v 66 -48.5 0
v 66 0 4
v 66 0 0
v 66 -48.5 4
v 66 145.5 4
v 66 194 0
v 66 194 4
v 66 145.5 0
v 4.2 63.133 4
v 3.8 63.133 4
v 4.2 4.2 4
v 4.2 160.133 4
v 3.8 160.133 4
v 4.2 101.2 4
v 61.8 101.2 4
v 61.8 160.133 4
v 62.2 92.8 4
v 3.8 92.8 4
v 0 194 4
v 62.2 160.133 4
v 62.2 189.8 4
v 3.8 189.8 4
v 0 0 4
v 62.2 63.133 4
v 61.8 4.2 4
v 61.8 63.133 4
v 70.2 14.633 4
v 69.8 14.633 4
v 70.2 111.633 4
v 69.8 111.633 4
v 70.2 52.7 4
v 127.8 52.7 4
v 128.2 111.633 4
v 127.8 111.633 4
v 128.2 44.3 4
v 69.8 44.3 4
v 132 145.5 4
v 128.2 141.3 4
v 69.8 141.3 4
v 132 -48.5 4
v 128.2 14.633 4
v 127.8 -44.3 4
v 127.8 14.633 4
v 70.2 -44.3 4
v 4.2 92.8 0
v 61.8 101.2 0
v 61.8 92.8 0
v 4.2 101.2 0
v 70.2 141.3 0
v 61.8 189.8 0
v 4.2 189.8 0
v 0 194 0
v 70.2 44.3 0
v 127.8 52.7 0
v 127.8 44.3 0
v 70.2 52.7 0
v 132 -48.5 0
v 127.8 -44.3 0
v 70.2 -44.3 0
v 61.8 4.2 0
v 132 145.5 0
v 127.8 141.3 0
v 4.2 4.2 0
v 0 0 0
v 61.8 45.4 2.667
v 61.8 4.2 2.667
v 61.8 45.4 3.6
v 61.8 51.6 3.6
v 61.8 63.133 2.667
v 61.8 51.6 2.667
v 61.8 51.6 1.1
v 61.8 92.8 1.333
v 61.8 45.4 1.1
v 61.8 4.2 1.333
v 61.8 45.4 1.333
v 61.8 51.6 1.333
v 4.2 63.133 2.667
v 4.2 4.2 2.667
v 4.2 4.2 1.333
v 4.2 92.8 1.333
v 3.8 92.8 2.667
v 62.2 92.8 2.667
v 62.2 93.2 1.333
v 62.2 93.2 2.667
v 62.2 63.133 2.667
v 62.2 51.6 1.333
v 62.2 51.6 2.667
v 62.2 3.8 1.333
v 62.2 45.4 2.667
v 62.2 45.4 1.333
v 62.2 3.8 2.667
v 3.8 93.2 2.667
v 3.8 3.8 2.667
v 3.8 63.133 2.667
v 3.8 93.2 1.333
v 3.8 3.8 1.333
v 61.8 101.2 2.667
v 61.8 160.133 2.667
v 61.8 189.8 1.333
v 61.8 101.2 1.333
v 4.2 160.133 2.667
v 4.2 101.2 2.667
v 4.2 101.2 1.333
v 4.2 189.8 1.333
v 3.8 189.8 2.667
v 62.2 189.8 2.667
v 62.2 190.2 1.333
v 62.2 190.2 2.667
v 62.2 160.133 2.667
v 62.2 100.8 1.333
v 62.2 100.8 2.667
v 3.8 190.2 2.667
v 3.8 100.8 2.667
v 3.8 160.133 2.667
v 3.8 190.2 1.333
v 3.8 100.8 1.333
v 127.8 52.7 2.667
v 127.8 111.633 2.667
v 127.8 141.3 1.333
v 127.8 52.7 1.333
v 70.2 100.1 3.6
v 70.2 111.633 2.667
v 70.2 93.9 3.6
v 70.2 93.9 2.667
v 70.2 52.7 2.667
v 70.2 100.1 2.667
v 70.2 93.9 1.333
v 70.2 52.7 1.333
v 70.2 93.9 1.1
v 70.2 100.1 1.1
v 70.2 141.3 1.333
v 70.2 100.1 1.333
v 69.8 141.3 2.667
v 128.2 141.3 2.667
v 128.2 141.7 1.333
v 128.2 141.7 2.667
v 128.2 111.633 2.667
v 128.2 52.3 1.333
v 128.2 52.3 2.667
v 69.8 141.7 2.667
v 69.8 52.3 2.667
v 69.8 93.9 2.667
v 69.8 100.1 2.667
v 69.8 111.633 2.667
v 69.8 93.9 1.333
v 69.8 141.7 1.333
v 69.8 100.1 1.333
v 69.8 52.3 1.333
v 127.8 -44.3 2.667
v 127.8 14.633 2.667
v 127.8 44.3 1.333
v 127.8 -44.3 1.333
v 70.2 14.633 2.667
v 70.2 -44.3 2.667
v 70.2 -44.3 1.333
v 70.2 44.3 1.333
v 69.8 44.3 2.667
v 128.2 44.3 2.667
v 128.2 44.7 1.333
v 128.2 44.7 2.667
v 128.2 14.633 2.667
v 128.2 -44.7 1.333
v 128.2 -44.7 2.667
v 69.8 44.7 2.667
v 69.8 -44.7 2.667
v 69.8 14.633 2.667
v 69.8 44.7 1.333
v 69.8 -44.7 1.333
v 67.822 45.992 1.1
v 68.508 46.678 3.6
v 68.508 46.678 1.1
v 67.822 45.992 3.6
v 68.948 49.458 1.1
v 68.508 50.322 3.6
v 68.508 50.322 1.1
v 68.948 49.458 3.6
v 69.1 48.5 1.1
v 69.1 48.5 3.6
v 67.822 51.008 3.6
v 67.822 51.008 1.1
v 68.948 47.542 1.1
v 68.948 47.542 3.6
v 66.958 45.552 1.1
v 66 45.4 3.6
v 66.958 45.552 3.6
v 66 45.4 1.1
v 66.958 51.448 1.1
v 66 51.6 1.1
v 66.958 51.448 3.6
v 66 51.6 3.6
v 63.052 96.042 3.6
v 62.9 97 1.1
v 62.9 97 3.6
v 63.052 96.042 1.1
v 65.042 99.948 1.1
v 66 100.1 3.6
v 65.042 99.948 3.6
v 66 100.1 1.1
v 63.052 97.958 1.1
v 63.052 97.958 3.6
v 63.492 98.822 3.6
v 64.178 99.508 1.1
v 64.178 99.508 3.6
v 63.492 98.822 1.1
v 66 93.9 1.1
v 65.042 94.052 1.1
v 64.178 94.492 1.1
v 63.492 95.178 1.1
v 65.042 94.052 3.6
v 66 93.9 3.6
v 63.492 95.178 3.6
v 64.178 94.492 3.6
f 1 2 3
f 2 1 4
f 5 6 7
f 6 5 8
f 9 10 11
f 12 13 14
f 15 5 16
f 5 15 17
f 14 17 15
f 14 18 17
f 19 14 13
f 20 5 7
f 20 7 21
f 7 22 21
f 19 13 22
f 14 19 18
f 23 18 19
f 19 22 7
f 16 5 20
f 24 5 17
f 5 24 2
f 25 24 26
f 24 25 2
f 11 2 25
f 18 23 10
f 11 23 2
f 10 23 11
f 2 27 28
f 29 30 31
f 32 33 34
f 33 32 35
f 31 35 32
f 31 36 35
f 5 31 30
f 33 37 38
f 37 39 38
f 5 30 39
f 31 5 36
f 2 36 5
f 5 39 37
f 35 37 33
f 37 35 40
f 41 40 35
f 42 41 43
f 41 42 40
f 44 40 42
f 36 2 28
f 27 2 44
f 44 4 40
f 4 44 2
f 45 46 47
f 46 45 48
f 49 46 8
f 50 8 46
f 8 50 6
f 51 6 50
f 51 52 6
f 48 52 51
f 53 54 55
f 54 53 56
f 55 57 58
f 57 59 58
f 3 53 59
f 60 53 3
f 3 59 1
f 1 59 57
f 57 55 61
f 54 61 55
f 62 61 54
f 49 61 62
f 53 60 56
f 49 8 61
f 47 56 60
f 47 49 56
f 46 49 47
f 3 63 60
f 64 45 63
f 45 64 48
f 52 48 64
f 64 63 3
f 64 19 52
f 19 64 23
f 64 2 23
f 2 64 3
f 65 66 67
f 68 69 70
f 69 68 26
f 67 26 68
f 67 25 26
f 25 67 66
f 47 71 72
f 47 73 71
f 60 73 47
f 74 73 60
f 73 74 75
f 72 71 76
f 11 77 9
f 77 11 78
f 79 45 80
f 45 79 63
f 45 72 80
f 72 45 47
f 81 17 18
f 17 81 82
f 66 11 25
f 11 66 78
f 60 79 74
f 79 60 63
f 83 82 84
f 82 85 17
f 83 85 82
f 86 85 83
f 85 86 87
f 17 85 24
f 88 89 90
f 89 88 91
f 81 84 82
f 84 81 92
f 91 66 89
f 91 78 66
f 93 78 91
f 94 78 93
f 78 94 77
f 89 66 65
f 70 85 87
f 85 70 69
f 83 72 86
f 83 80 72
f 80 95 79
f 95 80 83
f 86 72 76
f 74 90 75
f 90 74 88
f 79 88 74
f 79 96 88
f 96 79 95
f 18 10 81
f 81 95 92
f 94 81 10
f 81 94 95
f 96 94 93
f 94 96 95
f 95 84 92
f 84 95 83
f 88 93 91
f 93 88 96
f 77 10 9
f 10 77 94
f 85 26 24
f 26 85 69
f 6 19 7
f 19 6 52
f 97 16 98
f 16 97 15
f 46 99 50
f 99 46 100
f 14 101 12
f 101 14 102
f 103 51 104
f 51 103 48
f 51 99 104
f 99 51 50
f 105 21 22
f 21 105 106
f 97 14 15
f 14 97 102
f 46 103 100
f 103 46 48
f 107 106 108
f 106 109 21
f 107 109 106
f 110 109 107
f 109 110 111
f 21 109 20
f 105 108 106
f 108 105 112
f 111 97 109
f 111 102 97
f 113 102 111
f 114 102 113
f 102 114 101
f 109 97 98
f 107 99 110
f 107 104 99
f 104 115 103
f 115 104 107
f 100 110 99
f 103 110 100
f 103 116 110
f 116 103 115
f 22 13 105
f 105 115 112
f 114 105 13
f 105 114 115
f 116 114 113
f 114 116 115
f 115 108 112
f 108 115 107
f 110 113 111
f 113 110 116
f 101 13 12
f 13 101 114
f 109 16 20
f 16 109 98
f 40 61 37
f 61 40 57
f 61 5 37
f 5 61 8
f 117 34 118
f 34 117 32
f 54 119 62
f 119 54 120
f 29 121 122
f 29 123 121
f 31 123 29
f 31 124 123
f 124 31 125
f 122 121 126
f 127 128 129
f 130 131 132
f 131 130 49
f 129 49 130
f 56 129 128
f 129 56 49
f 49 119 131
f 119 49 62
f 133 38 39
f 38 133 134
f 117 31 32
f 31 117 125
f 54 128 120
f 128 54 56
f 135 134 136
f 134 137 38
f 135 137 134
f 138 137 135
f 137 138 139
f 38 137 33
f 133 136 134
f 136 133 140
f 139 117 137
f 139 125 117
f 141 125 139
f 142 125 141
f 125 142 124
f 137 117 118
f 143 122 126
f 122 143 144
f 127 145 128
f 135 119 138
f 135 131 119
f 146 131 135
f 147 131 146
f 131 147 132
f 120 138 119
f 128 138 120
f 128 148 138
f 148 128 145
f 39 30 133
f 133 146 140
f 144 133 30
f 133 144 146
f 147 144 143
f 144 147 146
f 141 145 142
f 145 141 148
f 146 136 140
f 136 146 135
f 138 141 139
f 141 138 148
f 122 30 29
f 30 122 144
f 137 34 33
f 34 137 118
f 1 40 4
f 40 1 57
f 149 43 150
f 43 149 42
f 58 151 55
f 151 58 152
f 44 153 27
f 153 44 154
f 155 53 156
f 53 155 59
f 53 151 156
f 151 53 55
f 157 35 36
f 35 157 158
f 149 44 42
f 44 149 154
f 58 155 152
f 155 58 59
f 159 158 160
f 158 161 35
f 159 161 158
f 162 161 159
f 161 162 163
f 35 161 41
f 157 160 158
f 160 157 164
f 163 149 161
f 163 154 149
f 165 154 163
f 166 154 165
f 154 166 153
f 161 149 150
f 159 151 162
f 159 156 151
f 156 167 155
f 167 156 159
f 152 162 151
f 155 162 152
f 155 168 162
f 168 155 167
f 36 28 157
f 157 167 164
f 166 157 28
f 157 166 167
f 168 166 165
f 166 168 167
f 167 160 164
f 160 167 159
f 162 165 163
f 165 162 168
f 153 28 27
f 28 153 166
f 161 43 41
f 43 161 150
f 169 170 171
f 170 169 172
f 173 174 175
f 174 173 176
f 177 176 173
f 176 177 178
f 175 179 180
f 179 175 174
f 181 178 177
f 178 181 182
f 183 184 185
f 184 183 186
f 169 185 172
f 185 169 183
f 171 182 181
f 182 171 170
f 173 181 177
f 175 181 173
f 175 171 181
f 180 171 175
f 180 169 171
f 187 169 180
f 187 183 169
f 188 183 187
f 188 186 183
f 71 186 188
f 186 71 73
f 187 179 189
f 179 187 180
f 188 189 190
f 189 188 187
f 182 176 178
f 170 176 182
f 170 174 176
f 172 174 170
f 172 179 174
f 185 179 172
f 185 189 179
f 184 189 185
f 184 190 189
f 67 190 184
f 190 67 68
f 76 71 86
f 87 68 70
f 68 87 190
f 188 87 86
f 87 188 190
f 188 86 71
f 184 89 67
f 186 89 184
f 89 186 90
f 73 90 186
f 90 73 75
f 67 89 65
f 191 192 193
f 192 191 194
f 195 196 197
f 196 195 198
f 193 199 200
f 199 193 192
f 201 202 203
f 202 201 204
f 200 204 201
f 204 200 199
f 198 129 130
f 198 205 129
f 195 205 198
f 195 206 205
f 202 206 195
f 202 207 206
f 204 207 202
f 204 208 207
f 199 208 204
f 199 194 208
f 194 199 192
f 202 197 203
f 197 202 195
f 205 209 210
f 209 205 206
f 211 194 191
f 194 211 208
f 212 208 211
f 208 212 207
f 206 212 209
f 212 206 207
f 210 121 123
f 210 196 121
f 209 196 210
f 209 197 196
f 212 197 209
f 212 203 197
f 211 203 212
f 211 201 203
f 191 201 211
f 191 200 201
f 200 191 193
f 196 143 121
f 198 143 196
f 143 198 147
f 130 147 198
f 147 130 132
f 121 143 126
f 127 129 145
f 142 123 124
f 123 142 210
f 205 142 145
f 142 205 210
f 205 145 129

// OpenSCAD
//cheki_width = 54;
//cheki_height = 86;

cheki_width = 58;
cheki_height = 89;

frame_width = 4;
thickness = 4;

margin = 0.2;

magnet_width = 6;
magnet_height = 2;


difference(){
    frame_group();
    
    translate([
        cheki_width + frame_width*2,
        cheki_height/2+frame_width,
        1.5-0.4
    ]){
    #cylinder(
        magnet_height +0.5,
        magnet_width/2+0.1,
        magnet_width/2+0.1,
        $fn=20
    );
    
    #translate([-magnet_width-0.2,-magnet_width/2-0.1,0])
    cube([
        magnet_width+0.2,
        magnet_width+0.2,
        magnet_height +0.5,
    ]);
    }
    
    translate([
        cheki_width + frame_width*2,
        cheki_height+frame_width*2,
        1.5-0.4
    ]){
    #cylinder(
        magnet_height +0.5,
        magnet_width/2+0.1,
        magnet_width/2+0.1,
        $fn=20
    );
    
    #translate([0,-magnet_width/2-0.1,0])
    cube([
        magnet_width+0.2,
        magnet_width+0.2,
        magnet_height +0.5,
    ]);
    }
}

module frame_group(){
frame();

translate([0,cheki_height+frame_width*2,0])
frame();

translate([cheki_width+frame_width*2,cheki_height/2+frame_width,0])
frame();

translate([cheki_width+frame_width*2,-cheki_height/2-frame_width,0])
frame();
}

module frame(){
difference(){
cube([
    cheki_width + frame_width*2,
    cheki_height+frame_width*2,
    thickness
    ]);
    
translate([frame_width+margin,frame_width+margin,-1])
cube([
    cheki_width-margin*2,
    cheki_height-margin*2,
    thickness+2
    ]);
        
translate([frame_width-margin,frame_width-margin,thickness/3])
cube([
    cheki_width+margin*2,
    cheki_height+margin*2,
    thickness/3
    ]);    
    
    
translate([frame_width-margin,frame_width-margin+cheki_height*2/3,thickness/3*2-0.1])
cube([
    cheki_width+margin*2,
    cheki_height/3,
    thickness/3+0.2
    ]);
}
}
